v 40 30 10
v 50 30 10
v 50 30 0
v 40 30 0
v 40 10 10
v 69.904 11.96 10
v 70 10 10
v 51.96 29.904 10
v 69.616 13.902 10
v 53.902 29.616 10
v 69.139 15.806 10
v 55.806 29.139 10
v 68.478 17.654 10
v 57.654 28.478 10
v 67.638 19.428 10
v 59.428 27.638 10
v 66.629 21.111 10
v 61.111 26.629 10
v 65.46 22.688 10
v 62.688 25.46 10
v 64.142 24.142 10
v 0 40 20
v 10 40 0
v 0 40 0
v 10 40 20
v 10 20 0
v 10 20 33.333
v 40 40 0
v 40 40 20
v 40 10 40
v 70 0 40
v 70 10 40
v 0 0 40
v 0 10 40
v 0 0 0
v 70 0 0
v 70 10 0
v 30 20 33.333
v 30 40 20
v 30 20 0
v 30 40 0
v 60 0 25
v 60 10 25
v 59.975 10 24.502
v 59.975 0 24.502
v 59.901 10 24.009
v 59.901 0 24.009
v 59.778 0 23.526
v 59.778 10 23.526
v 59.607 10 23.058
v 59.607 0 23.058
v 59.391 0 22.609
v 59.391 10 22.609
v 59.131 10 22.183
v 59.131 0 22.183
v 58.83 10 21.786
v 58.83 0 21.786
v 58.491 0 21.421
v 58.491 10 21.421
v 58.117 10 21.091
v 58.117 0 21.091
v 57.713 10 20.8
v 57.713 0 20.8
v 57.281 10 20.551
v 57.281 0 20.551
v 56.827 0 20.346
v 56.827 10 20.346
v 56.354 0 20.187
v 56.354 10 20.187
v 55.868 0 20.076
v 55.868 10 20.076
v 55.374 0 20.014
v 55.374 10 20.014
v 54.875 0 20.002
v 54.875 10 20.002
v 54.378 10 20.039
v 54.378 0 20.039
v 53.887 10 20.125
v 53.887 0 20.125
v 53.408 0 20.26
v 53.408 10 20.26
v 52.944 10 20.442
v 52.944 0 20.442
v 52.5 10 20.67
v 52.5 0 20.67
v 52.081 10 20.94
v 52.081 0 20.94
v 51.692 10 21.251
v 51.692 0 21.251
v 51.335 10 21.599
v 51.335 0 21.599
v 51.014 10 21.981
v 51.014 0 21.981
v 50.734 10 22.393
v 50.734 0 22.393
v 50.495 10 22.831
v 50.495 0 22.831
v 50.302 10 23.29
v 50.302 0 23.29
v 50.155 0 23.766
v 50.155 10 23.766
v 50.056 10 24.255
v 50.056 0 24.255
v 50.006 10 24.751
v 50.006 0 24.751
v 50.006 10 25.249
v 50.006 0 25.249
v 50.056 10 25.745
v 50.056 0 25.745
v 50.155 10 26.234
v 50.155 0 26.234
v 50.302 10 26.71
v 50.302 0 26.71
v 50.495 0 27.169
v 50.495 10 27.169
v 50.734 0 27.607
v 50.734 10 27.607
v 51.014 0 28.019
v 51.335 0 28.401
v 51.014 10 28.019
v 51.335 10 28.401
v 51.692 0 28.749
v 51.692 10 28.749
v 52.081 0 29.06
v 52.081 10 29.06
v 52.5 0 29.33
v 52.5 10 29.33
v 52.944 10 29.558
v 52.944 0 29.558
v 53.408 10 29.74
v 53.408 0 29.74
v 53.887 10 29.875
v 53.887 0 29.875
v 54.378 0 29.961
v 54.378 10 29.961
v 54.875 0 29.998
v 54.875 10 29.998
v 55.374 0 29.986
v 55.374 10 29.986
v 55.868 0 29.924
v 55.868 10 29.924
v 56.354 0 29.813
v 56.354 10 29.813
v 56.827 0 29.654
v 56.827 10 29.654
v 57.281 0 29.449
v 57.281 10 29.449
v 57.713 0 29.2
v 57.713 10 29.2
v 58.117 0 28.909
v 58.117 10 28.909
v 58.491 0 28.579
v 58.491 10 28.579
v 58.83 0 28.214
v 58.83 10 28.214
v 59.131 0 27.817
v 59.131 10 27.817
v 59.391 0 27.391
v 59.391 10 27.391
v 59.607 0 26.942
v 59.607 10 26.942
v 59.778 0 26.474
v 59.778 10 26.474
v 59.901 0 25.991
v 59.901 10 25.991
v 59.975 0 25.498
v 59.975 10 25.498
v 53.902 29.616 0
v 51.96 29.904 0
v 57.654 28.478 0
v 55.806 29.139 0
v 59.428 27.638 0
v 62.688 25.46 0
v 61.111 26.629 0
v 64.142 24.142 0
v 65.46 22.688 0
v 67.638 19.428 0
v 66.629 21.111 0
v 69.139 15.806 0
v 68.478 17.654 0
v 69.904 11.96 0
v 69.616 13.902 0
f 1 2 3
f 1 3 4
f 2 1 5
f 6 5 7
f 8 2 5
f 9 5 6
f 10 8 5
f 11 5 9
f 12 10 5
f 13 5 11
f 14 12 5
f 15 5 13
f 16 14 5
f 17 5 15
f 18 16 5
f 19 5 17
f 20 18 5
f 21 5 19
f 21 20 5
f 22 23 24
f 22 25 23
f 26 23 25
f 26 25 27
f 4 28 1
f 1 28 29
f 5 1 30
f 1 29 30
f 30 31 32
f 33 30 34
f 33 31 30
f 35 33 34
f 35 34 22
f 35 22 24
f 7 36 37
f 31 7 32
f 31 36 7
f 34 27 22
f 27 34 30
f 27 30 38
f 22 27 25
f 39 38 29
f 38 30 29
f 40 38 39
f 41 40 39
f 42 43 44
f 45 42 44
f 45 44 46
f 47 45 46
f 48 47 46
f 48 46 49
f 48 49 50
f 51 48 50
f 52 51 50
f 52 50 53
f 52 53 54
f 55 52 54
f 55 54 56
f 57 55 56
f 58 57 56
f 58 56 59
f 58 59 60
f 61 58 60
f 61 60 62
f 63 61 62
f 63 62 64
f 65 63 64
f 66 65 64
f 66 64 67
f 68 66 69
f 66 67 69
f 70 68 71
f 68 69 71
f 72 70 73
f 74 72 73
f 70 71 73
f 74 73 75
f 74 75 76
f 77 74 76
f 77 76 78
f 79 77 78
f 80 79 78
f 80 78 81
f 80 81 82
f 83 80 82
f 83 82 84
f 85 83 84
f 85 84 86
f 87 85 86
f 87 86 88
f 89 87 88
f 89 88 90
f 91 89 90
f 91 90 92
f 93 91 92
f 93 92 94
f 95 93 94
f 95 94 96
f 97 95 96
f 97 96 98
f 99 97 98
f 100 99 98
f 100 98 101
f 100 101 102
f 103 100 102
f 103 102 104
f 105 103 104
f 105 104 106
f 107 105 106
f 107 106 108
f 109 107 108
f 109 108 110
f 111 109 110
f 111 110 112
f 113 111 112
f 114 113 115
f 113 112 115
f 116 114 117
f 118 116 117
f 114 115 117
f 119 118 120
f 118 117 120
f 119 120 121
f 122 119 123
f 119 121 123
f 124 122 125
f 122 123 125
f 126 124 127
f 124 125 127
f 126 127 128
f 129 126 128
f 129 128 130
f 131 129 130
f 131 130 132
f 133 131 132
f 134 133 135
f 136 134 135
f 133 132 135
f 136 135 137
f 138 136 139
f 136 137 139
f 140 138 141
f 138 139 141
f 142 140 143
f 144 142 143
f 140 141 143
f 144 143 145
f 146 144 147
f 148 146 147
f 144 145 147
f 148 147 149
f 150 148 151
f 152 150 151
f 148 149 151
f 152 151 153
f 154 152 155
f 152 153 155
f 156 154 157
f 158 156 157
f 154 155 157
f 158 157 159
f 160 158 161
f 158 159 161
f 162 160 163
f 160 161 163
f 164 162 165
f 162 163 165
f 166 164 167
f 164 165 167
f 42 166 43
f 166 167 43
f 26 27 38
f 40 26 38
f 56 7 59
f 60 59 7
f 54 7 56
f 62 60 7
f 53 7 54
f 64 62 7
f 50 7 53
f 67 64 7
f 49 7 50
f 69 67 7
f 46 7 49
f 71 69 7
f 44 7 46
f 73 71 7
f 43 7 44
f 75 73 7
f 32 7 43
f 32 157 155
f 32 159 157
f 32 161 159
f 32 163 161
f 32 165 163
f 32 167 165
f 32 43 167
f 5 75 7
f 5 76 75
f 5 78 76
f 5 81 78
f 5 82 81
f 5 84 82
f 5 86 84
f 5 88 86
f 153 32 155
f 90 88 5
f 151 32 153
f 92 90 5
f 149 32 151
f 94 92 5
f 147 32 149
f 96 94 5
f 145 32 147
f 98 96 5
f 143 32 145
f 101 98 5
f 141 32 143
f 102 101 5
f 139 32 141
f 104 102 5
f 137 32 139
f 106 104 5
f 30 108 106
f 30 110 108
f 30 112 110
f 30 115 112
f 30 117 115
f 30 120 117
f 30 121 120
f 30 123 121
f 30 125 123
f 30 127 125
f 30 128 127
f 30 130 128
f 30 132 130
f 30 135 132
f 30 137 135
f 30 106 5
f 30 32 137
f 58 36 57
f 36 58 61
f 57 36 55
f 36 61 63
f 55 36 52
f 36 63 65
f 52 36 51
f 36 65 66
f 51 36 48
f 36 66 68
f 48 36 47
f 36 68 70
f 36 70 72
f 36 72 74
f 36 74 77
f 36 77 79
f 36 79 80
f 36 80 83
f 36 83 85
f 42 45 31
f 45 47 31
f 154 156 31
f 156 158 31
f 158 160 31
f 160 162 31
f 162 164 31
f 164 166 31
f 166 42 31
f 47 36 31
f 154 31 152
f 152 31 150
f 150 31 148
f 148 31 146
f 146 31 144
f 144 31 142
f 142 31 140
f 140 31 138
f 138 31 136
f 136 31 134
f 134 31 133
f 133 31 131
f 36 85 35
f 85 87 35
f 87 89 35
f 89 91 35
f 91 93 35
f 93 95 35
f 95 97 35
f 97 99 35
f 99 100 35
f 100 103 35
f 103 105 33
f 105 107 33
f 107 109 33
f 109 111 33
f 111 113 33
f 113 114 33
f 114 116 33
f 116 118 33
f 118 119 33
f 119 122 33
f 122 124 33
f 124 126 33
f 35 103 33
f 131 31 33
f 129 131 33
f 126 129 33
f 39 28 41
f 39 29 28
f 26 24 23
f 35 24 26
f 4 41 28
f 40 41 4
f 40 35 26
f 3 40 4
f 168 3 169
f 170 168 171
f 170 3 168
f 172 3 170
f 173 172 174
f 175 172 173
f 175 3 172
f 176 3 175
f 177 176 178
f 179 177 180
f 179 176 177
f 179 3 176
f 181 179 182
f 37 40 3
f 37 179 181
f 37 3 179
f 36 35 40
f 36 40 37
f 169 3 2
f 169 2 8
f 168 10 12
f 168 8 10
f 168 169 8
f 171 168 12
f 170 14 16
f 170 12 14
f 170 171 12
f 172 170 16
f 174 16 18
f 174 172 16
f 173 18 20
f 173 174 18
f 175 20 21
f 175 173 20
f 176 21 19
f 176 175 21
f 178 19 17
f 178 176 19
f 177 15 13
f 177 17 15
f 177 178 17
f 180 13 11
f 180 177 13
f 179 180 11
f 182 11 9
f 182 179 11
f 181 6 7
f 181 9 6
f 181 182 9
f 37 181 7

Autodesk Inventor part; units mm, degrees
ref_plane "YZ Plane" through (0, 0, 0) normal (1, 0, 0) x (0, 1, 0)
ref_plane "XZ Plane" through (0, 0, 0) normal (0, 1, 0) x (-1, 0, 0)
ref_plane "XY Plane" through (0, 0, 0) normal (0, 0, 1) x (1, 0, 0)
sketch "草圖1" plane through (0, 0, 0) normal (0, 1, 0) x (-1, 0, 0)
  line L0 (0, 0) -> (-70, 0)
  line L1 (-70, 0) -> (-70, 40)
  line L2 (-70, 40) -> (0, 40)
  line L3 (0, 40) -> (0, 0)
  dimension "d0" = 70
  dimension "d1" = 40
extrude "擠出1" add sketch "草圖1" along normal blind 40
sketch "草圖2" plane through (0, 0, 40) normal (0, 0, 1) x (1, 0, 0)
  line L0 (0, 0) -> (0, 40) projected
  line L1 (0, 40) -> (70, 40) projected
  line L2 (70, 40) -> (70, 0) projected
  line L3 (70, 0) -> (0, 0) projected
  line L4 (70, 40) -> (0, 40) projected
  line L5 (40, 40) -> (70, 40)
  line L6 (70, 40) -> (70, 10)
  line L7 (70, 10) -> (40, 10)
  line L8 (40, 10) -> (40, 40)
  dimension "d4" = 10
  dimension "d5" = 30
extrude "擠出2" cut sketch "草圖2" against normal blind 30 contours L1 L2 L7 L8
sketch "草圖3" plane through (0, 0, 10) normal (0, 0, 1) x (1, 0, 0)
  line L0 (40, 40) -> (40, 10) projected
  line L1 (40, 10) -> (70, 10) projected
  line L2 (70, 40) -> (70, 10) projected
  line L3 (40, 40) -> (70, 40) projected
  line L4 (0, 40) -> (40, 40) projected
  line L5 (0, 0) -> (0, 40) projected
  line L6 (70, 0) -> (0, 0) projected
  line L7 (70, 10) -> (70, 0) projected
  line L8 (40, 40) -> (70, 40)
  line L9 (70, 40) -> (70, 30)
  line L10 (70, 30) -> (40, 30)
  line L11 (40, 30) -> (40, 40)
  point P0 (40, 30)
  dimension "d8" = 10
extrude "擠出3" cut sketch "草圖3" against normal blind 10 contours L3 L2 L10 L0
sketch "草圖4" plane through (40, 10, 40) normal (1, 0, 0) x (0, 0, -1)
  line L0 (0, 0) -> (30, 0) projected
  line L1 (30, 0) -> (30, 20) projected
  line L2 (30, 20) -> (40, 20) projected
  line L3 (40, 30) -> (40, 20) projected
  line L4 (0, 30) -> (40, 30) projected
  line L5 (0, 0) -> (0, 30) projected
  line L6 (0, -10) -> (0, 0) projected
  line L7 (40, -10) -> (0, -10) projected
  line L8 (40, 20) -> (40, -10) projected
  line L9 (0, 0) -> (20, 30)
  dimension "d11" = 20
extrude "擠出4" cut sketch "草圖4" against normal through all contours L5 L4 L9
sketch "草圖5" plane through (70, 0, 0) normal (0, 0, -1) x (-1, 0, 0)
  line L0 (0, 30) -> (30, 30) projected
  line L1 (30, 30) -> (30, 40) projected
  line L2 (30, 40) -> (70, 40) projected
  line L3 (70, 40) -> (70, 0) projected
  line L4 (70, 0) -> (0, 0) projected
  line L5 (0, 0) -> (0, 30) projected
  line L6 (40, 40) -> (60, 40)
  line L7 (60, 40) -> (60, 20)
  line L8 (60, 20) -> (40, 20)
  line L9 (40, 20) -> (40, 40)
  line L10 (30, 40) -> (70, 40) projected
  point P0 (50, 40)
  dimension "d14" = 20
  dimension "d15" = 20
extrude "擠出5" cut sketch "草圖5" against normal through all contours L2 L7 L8 L9
fillet "圓角1" radius 20 1 edges at (70, 30, 5)
sketch "草圖6" plane through (40, 10, 40) normal (0, 1, 0) x (1, 0, 0)
  line L0 (0, 0) -> (-40, 0) projected
  line L1 (-40, 0) -> (-40, 40) projected
  line L2 (-40, 40) -> (30, 40) projected
  line L3 (30, 40) -> (30, 30) projected
  line L4 (30, 30) -> (0, 30) projected
  line L5 (0, 30) -> (0, 0) projected
  line L6 (30, 0) -> (0, 0) projected
  line L7 (30, 30) -> (30, 0) projected
  circle A0 centre (15, 15) radius 5
  dimension "d19" = 10
  dimension "d20" = 15
  dimension "d21" = 15
extrude "擠出6" cut sketch "草圖6" against normal through all contours A0
properties part number "31" material "鋼、碳鋼"
